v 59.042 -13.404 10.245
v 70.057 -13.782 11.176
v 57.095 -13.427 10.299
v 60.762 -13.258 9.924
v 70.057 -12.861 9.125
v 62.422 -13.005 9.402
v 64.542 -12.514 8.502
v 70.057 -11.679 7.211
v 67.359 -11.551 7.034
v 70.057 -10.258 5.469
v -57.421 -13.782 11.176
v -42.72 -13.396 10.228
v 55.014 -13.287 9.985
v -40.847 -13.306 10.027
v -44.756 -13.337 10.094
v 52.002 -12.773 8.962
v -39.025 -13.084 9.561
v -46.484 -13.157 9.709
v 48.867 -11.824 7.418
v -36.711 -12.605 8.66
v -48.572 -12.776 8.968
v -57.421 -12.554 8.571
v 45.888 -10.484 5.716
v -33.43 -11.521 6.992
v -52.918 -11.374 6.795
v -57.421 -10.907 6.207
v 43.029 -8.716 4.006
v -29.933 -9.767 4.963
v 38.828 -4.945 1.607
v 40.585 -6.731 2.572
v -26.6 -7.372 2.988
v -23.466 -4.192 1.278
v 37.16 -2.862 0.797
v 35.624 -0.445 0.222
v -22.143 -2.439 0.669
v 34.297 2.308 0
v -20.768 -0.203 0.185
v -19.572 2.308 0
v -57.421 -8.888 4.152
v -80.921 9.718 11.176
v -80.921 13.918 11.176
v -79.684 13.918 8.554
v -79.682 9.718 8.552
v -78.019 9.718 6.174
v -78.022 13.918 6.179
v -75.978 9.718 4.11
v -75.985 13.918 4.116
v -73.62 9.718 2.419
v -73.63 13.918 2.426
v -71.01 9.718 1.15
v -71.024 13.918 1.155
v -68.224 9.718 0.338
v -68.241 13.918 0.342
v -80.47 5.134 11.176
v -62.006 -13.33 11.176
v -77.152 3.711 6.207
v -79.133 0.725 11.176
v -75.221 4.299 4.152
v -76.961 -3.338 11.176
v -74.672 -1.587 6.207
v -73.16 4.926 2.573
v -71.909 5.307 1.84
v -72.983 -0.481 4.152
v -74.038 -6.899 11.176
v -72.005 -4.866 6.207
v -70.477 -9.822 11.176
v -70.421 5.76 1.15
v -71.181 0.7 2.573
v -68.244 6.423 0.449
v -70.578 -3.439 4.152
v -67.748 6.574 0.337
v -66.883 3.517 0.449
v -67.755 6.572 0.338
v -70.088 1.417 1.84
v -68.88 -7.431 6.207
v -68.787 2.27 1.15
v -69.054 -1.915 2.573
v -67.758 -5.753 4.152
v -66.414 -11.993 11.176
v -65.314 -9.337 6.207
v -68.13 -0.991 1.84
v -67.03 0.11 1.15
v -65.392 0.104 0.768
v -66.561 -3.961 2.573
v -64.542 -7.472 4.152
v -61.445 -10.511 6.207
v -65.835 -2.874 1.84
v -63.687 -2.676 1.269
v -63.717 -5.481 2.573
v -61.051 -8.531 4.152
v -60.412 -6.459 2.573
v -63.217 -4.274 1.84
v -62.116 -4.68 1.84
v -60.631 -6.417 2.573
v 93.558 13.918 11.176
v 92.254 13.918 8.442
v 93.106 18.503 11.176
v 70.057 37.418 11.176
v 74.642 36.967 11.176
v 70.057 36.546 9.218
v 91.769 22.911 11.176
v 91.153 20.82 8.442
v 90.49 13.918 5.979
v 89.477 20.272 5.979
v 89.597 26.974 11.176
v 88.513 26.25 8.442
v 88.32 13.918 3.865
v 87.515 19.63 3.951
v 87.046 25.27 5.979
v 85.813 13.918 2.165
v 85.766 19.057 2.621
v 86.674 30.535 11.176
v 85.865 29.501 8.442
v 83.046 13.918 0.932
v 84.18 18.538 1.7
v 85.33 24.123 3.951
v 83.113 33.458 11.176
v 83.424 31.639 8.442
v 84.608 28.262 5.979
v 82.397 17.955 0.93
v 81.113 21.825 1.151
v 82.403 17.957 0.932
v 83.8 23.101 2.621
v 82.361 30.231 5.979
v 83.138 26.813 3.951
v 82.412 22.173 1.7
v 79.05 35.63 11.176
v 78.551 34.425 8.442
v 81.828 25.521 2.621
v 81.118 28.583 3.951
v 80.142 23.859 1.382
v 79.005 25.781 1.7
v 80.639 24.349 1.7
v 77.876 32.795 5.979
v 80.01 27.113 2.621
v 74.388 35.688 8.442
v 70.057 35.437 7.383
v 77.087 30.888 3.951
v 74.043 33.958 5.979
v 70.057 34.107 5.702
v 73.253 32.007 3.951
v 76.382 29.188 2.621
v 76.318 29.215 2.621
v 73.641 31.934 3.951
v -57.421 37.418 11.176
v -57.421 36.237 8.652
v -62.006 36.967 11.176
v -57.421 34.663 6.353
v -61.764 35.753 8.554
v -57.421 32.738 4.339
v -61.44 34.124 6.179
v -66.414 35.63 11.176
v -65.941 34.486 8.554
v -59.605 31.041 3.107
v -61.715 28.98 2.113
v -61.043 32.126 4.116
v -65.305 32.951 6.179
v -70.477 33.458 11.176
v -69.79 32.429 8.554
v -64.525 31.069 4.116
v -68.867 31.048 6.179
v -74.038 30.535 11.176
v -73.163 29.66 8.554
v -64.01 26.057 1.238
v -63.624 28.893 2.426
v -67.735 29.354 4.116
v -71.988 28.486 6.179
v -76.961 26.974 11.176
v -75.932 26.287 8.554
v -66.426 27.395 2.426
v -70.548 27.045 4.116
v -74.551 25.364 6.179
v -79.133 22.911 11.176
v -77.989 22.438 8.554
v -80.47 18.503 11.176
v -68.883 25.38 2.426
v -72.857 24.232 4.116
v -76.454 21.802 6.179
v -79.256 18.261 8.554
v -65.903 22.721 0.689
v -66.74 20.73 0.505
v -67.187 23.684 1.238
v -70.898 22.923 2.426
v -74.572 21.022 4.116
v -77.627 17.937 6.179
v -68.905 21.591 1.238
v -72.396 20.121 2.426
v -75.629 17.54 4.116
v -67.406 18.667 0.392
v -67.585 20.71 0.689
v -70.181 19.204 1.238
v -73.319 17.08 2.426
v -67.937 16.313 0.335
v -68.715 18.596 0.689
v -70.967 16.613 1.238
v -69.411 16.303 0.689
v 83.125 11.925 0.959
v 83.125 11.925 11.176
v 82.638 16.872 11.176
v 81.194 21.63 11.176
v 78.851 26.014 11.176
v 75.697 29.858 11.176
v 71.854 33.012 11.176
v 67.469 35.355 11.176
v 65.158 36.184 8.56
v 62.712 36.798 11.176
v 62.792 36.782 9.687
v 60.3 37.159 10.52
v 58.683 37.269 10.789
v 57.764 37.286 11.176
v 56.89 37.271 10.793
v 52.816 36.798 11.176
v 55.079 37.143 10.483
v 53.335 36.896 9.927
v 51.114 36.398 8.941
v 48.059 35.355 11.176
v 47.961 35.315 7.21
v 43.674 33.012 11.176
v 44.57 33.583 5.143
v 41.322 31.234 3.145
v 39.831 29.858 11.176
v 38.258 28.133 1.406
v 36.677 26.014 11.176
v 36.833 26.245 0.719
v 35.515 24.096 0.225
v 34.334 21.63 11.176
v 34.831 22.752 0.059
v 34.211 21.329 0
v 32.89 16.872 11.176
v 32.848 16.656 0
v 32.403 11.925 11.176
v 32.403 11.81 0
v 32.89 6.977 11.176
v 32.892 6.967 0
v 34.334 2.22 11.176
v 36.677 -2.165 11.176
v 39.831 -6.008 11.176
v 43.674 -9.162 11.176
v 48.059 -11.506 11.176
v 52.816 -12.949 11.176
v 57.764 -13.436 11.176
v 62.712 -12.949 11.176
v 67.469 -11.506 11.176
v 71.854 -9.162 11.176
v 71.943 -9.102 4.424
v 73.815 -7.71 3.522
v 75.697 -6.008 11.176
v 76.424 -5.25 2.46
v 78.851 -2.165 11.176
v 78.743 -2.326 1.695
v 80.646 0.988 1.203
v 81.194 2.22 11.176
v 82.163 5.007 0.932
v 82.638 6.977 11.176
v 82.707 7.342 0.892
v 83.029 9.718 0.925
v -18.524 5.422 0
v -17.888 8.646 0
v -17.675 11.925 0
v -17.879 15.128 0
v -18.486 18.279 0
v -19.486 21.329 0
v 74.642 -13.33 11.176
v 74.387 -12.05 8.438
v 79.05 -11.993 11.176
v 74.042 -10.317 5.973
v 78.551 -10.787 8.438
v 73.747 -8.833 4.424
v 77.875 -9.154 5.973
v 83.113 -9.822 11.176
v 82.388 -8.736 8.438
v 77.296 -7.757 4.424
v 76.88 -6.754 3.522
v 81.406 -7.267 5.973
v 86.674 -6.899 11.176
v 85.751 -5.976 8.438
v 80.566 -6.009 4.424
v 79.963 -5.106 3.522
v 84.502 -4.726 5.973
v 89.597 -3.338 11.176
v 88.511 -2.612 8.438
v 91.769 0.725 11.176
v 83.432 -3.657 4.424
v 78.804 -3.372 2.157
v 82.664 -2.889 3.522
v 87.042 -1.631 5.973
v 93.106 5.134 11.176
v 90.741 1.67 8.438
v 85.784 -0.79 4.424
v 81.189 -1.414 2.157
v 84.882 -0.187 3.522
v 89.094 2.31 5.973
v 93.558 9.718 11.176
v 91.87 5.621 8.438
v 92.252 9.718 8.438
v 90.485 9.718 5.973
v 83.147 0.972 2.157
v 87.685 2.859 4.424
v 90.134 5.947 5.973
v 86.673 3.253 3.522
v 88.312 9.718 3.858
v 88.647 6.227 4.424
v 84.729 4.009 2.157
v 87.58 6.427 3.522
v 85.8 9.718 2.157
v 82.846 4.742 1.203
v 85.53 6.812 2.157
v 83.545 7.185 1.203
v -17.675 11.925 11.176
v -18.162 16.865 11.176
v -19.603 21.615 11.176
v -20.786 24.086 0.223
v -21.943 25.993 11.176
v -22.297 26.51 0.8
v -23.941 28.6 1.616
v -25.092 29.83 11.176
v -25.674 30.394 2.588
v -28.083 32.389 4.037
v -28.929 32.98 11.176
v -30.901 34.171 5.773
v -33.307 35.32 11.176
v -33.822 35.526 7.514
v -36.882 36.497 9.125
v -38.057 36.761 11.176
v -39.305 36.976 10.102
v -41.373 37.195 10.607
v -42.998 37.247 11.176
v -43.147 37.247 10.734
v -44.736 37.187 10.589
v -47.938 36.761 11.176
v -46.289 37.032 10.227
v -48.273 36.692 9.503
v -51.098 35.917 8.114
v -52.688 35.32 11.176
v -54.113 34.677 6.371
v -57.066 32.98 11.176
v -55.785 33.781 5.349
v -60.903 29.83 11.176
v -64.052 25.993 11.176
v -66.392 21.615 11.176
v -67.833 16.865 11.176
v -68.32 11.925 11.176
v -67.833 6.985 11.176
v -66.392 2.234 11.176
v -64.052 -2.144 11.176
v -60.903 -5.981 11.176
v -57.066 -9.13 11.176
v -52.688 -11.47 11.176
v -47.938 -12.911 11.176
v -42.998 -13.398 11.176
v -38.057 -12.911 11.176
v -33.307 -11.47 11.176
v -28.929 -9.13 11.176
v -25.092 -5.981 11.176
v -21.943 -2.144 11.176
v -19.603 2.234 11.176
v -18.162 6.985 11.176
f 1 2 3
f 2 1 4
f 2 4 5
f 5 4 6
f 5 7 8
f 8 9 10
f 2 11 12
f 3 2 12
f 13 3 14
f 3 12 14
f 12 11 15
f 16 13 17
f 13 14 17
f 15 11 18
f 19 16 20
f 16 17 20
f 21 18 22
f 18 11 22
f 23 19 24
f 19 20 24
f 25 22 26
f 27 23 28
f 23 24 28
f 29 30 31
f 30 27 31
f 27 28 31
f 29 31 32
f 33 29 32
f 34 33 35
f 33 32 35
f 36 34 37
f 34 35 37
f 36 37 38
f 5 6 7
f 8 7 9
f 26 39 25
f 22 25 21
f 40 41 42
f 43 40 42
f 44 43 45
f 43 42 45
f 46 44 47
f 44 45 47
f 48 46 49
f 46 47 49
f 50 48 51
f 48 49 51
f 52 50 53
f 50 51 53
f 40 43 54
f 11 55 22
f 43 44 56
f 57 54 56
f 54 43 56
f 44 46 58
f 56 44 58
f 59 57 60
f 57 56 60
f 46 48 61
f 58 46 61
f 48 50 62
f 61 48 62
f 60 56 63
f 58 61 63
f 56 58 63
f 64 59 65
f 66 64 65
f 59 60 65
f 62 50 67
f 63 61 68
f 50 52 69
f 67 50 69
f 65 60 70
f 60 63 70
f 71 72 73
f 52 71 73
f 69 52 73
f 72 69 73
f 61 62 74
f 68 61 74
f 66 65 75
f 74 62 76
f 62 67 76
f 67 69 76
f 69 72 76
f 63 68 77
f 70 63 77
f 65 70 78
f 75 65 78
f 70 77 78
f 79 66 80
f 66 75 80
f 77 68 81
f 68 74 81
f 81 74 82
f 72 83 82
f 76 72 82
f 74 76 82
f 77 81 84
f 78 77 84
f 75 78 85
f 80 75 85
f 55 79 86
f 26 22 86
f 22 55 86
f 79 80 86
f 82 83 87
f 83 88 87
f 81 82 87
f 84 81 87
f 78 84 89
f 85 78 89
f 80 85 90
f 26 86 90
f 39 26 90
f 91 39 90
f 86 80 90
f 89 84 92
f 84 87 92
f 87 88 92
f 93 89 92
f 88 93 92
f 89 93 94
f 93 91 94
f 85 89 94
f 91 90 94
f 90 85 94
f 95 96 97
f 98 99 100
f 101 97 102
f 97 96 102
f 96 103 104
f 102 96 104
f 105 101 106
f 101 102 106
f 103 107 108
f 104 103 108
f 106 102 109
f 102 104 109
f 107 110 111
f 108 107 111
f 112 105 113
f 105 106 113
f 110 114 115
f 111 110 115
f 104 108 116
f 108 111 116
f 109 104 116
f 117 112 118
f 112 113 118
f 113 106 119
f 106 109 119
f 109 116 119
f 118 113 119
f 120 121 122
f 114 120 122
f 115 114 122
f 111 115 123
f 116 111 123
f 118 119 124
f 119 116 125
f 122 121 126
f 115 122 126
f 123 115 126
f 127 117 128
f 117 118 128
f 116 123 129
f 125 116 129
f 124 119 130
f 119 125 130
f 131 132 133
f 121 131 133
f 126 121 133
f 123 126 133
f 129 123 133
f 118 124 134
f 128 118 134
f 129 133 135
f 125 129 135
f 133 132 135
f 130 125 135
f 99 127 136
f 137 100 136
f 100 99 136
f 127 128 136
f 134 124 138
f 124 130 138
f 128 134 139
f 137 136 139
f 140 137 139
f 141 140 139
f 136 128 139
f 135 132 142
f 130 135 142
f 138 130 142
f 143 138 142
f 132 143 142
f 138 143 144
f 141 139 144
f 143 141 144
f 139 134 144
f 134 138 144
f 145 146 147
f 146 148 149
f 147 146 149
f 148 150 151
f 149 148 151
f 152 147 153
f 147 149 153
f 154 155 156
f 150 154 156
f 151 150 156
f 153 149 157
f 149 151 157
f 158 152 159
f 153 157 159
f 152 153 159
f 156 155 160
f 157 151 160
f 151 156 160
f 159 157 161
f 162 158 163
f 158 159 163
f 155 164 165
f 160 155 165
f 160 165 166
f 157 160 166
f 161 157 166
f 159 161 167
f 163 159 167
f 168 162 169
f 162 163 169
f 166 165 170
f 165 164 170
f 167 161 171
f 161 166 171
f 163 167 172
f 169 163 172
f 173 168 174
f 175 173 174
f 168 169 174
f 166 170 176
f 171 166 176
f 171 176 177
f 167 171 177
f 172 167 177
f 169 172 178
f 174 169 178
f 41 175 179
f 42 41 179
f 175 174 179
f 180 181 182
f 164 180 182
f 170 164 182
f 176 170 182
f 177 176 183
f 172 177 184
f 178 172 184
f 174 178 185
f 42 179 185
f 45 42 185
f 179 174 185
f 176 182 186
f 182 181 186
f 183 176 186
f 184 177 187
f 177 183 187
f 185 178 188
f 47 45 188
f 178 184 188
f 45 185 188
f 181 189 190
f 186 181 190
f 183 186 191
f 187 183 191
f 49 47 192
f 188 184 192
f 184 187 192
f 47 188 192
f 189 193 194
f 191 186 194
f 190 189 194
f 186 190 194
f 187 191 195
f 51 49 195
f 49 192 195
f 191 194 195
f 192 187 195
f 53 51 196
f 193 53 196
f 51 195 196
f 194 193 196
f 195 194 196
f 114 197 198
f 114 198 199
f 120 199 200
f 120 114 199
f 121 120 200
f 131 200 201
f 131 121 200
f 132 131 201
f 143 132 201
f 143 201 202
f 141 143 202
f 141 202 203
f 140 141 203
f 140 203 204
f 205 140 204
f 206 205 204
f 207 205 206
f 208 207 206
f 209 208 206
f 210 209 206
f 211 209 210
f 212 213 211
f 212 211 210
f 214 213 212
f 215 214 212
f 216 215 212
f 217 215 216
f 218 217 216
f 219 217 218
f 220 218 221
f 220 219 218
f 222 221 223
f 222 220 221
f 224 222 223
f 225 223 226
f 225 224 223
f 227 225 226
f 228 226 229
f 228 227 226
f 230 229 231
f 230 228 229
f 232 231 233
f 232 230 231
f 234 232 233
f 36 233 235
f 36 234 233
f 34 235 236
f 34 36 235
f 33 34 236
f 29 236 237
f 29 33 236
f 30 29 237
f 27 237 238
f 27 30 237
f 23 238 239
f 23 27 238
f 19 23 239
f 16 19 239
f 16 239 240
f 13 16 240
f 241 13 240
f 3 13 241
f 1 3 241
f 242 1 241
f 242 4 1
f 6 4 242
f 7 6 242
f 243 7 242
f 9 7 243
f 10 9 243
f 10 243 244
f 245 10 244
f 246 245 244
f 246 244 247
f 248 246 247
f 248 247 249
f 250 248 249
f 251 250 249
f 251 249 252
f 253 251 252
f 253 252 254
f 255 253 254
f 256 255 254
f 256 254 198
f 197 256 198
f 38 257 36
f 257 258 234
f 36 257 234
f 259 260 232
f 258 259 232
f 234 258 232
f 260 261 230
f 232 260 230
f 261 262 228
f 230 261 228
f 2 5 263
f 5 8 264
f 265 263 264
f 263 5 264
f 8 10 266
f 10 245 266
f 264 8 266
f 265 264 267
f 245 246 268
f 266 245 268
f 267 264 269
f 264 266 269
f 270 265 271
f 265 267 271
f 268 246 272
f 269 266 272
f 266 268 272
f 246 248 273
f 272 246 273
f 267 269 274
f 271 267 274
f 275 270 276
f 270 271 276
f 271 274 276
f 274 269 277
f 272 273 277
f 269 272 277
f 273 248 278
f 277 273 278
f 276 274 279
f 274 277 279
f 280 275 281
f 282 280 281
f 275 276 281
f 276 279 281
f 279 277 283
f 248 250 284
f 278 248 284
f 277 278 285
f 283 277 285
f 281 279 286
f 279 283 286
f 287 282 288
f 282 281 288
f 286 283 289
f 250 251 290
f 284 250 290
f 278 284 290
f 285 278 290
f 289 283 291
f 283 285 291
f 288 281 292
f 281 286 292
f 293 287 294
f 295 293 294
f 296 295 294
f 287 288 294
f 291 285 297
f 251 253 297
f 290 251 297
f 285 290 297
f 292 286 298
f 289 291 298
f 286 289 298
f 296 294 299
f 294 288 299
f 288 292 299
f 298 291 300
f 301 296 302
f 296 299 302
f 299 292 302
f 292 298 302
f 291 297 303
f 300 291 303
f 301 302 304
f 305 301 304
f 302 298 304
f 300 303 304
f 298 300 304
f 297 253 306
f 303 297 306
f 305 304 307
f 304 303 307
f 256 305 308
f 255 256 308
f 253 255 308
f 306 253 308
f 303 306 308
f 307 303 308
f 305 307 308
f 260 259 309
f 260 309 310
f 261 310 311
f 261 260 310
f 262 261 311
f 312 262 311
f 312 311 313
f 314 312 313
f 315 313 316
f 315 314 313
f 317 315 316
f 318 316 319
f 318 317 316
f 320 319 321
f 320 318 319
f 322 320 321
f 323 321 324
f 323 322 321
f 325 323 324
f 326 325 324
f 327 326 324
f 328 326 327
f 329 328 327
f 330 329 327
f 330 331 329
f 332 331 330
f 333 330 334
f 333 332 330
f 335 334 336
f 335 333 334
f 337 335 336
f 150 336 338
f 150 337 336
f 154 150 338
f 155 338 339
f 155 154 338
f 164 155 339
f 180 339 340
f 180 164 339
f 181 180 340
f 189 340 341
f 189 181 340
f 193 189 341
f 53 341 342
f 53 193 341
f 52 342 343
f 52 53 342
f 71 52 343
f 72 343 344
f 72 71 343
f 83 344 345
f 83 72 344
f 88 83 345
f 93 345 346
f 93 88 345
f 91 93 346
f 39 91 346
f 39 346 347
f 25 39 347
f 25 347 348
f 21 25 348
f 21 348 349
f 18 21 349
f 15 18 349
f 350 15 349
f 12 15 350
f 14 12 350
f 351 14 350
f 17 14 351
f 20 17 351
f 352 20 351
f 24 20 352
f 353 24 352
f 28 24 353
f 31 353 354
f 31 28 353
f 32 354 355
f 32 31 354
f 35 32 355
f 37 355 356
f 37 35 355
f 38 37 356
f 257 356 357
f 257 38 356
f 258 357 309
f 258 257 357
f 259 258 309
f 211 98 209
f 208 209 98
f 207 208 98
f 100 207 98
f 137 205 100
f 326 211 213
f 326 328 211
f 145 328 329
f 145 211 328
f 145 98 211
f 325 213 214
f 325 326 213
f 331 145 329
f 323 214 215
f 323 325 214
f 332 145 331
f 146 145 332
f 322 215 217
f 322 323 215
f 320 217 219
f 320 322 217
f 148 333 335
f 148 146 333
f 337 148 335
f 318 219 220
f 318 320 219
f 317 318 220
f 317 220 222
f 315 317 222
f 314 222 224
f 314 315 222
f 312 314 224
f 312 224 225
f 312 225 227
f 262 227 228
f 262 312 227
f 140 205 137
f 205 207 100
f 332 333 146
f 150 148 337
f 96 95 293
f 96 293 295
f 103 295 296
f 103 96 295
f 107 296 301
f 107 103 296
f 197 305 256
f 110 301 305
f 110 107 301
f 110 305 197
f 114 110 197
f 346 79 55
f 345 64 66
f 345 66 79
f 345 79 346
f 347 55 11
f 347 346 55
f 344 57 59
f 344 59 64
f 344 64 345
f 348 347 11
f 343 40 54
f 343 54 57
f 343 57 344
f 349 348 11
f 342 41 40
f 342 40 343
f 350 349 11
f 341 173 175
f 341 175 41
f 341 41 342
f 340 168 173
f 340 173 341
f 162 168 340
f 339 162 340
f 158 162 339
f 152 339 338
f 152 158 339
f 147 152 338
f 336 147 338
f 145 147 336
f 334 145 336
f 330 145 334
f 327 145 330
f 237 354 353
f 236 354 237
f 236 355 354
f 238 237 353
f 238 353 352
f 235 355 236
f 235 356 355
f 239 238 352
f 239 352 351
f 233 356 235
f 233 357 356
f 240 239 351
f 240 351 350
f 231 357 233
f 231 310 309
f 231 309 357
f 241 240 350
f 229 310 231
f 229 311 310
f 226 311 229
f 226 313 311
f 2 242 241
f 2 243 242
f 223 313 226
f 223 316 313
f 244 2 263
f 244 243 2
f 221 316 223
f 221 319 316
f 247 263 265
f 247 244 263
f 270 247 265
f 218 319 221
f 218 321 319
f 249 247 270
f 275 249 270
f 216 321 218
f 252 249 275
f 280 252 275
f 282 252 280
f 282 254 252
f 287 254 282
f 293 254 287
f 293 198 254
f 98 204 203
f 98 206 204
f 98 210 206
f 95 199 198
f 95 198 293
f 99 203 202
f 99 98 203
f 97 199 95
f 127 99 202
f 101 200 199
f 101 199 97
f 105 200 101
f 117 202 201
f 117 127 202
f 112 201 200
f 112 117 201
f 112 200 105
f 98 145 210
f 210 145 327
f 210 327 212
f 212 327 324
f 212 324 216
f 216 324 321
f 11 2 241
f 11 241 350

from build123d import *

# Parameters (mm, degrees)
F0_R         = 25.3224131448
F0_R_2       = 25.3609127301
F1_DEPTH     = 11.176
F2_T1_DEPTH  = 4.1998379789
F2_T3_DEPTH  = 127.4783204379
F2_T5_DEPTH  = 4.1998416744
F2_T7_DEPTH  = 127.4783167424
F2_T10_ANGLE = 90
F2_T12_ANGLE = 90
F2_T14_ANGLE = 90
F2_T16_ANGLE = 90


# Not quite as in the source:
# - a fillet or chamfer that OpenCascade refuses, or shapes differently, is made with other operations: its cross-section is extruded or revolved along the edge and cut away or added


with BuildPart() as f1:
    # F0 (on Top) → F1 (new body)
    with BuildSketch(Plane.XY):
        with BuildLine():
            Line((70.0572131213, 37.4184697866), (-57.4211036211, 37.4184697866))
            ThreePointArc((-57.4211036211, 37.4184697866), (-74.0383517658, 30.5353802358), (-80.9214413166, 13.9181320912))
            Line((-80.9214413166, 13.9181320912), (-80.9214413166, 9.7182941123))
            ThreePointArc((-80.9214413166, 9.7182941123), (-74.0383528482, -6.8989514193), (-57.4211073166, -13.7820398877))
            Line((-57.4211073166, -13.7820398877), (70.0572131213, -13.7820398877))
            ThreePointArc((70.0572131213, -13.7820398877), (86.6744586529, -6.8989514193), (93.5575471213, 9.7182941123))
            Line((93.5575471213, 9.7182941123), (93.5575471213, 13.9181357866))
            ThreePointArc((93.5575471213, 13.9181357866), (86.6744586529, 30.5353813182), (70.0572131213, 37.4184697866))
        make_face()
        with Locations((-42.9976209998, 11.9247278199)):
            Circle(F0_R, mode=Mode.SUBTRACT)
        with Locations((57.7639937401, 11.9247278199)):
            Circle(F0_R_2, mode=Mode.SUBTRACT)
    extrude(amount=F1_DEPTH)

    # F2: fillet of radius 17.1698868556 on 1 edges, made by hand

    # F2_s2 → F2_t1 (cut)
    with BuildSketch(Plane.XZ.offset(-13.9181320912)):
        with BuildLine():
            ThreePointArc((-80.9214413166, 11.176), (-74.6269133611, 3.0681250194), (-64.8317447689, 0))
            Line((-64.8317447689, 0), (-64.8317447689, -0.3433977371))
            Line((-64.8317447689, -0.3433977371), (-80.9214413166, -0.3433977371))
            Line((-80.9214413166, -0.3433977371), (-81.2648390537, 0))
            ThreePointArc((-81.2648390537, 0), (-81.2648390537, 5.588), (-81.2432352476, 11.0561222629))
            Line((-81.2432352476, 11.0561222629), (-80.9214413166, 11.176))
        make_face()
    extrude(amount=F2_T1_DEPTH, mode=Mode.SUBTRACT)

    # F2_s4 → F2_t3 (cut)
    with BuildSketch(Plane.YZ.offset(-57.4211073166)):
        with BuildLine():
            ThreePointArc((-13.7820398877, 11.176), (-7.4875119322, 3.0681250194), (2.3076566599, 0))
            Line((2.3076566599, 0), (2.3076566599, -0.3433977371))
            Line((2.3076566599, -0.3433977371), (-13.7820398877, -0.3433977371))
            Line((-13.7820398877, -0.3433977371), (-14.1254376248, 0))
            ThreePointArc((-14.1254376248, 0), (-14.1254376248, 5.588), (-14.1038338187, 11.0561222629))
            Line((-14.1038338187, 11.0561222629), (-13.7820398877, 11.176))
        make_face()
    extrude(amount=F2_T3_DEPTH, mode=Mode.SUBTRACT)

    # F2_s6 → F2_t5 (cut)
    with BuildSketch(Plane.XZ.offset(-13.9181357866)):
        with BuildLine():
            ThreePointArc((93.5575471213, 11.176), (87.2630191658, 3.0681250194), (77.4678505736, 0))
            Line((77.4678505736, 0), (77.4678505736, -0.3433977371))
            Line((77.4678505736, -0.3433977371), (93.5575471213, -0.3433977371))
            Line((93.5575471213, -0.3433977371), (93.9009448584, 0))
            ThreePointArc((93.9009448584, 0), (93.9009448584, 5.588), (93.8793410523, 11.0561222629))
            Line((93.8793410523, 11.0561222629), (93.5575471213, 11.176))
        make_face()
    extrude(amount=F2_T5_DEPTH, mode=Mode.SUBTRACT)

    # F2_s8 → F2_t7 (cut)
    with BuildSketch(Plane.YZ.offset(-57.4211036211)):
        with BuildLine():
            ThreePointArc((37.4184697866, 11.176), (31.1239418311, 3.0681250194), (21.328773239, 0))
            Line((21.328773239, 0), (21.328773239, -0.3433977371))
            Line((21.328773239, -0.3433977371), (37.4184697866, -0.3433977371))
            Line((37.4184697866, -0.3433977371), (37.7618675238, 0))
            ThreePointArc((37.7618675238, 0), (37.7618675238, 5.588), (37.7402637176, 11.0561222629))
            Line((37.7402637176, 11.0561222629), (37.4184697866, 11.176))
        make_face()
    extrude(amount=F2_T7_DEPTH, mode=Mode.SUBTRACT)

    # F2_s9 → F2_t10 (revolve, cut)
    with BuildSketch(Plane.XZ.offset(-9.7182941123)):
        with BuildLine():
            ThreePointArc((-80.9214413166, 11.176), (-74.6269133611, 3.0681250194), (-64.8317447689, 0))
            Line((-64.8317447689, 0), (-64.8317447689, -0.3433977371))
            Line((-64.8317447689, -0.3433977371), (-80.9214413166, -0.3433977371))
            Line((-80.9214413166, -0.3433977371), (-81.2648390537, 0))
            ThreePointArc((-81.2648390537, 0), (-81.2648390537, 5.588), (-81.2432352476, 11.0561222629))
            Line((-81.2432352476, 11.0561222629), (-80.9214413166, 11.176))
        make_face()
    revolve(axis=Axis((-57.4211073166, 9.7182941123, 0), (0, 0, 1)), revolution_arc=F2_T10_ANGLE, mode=Mode.SUBTRACT)

    # F2_s11 → F2_t12 (revolve, cut)
    with BuildSketch(Plane.YZ.offset(70.0572131213)):
        with BuildLine():
            ThreePointArc((-13.7820398877, 11.176), (-7.4875119322, 3.0681250194), (2.3076566599, 0))
            Line((2.3076566599, 0), (2.3076566599, -0.3433977371))
            Line((2.3076566599, -0.3433977371), (-13.7820398877, -0.3433977371))
            Line((-13.7820398877, -0.3433977371), (-14.1254376248, 0))
            ThreePointArc((-14.1254376248, 0), (-14.1254376248, 5.588), (-14.1038338187, 11.0561222629))
            Line((-14.1038338187, 11.0561222629), (-13.7820398877, 11.176))
        make_face()
    revolve(axis=Axis((70.0572131213, 9.7182941123, 0), (0, 0, 1)), revolution_arc=F2_T12_ANGLE, mode=Mode.SUBTRACT)

    # F2_s13 → F2_t14 (revolve, cut)
    with BuildSketch(Plane.XZ.offset(-13.9181357866)):
        with BuildLine():
            ThreePointArc((93.5575471213, 11.176), (87.2630191658, 3.0681250194), (77.4678505736, 0))
            Line((77.4678505736, 0), (77.4678505736, -0.3433977371))
            Line((77.4678505736, -0.3433977371), (93.5575471213, -0.3433977371))
            Line((93.5575471213, -0.3433977371), (93.9009448584, 0))
            ThreePointArc((93.9009448584, 0), (93.9009448584, 5.588), (93.8793410523, 11.0561222629))
            Line((93.8793410523, 11.0561222629), (93.5575471213, 11.176))
        make_face()
    revolve(axis=Axis((70.0572131213, 13.9181357866, 0), (0, 0, 1)), revolution_arc=F2_T14_ANGLE, mode=Mode.SUBTRACT)

    # F2_s15 → F2_t16 (revolve, cut)
    with BuildSketch(Plane.YZ.offset(-57.4211036211)):
        with BuildLine():
            ThreePointArc((37.4184697866, 11.176), (31.1239418311, 3.0681250194), (21.328773239, 0))
            Line((21.328773239, 0), (21.328773239, -0.3433977371))
            Line((21.328773239, -0.3433977371), (37.4184697866, -0.3433977371))
            Line((37.4184697866, -0.3433977371), (37.7618675238, 0))
            ThreePointArc((37.7618675238, 0), (37.7618675238, 5.588), (37.7402637176, 11.0561222629))
            Line((37.7402637176, 11.0561222629), (37.4184697866, 11.176))
        make_face()
    revolve(axis=Axis((-57.4211036211, 13.9181320912, 0), (0, 0, 1)), revolution_arc=F2_T16_ANGLE, mode=Mode.SUBTRACT)


solid = f1.part
